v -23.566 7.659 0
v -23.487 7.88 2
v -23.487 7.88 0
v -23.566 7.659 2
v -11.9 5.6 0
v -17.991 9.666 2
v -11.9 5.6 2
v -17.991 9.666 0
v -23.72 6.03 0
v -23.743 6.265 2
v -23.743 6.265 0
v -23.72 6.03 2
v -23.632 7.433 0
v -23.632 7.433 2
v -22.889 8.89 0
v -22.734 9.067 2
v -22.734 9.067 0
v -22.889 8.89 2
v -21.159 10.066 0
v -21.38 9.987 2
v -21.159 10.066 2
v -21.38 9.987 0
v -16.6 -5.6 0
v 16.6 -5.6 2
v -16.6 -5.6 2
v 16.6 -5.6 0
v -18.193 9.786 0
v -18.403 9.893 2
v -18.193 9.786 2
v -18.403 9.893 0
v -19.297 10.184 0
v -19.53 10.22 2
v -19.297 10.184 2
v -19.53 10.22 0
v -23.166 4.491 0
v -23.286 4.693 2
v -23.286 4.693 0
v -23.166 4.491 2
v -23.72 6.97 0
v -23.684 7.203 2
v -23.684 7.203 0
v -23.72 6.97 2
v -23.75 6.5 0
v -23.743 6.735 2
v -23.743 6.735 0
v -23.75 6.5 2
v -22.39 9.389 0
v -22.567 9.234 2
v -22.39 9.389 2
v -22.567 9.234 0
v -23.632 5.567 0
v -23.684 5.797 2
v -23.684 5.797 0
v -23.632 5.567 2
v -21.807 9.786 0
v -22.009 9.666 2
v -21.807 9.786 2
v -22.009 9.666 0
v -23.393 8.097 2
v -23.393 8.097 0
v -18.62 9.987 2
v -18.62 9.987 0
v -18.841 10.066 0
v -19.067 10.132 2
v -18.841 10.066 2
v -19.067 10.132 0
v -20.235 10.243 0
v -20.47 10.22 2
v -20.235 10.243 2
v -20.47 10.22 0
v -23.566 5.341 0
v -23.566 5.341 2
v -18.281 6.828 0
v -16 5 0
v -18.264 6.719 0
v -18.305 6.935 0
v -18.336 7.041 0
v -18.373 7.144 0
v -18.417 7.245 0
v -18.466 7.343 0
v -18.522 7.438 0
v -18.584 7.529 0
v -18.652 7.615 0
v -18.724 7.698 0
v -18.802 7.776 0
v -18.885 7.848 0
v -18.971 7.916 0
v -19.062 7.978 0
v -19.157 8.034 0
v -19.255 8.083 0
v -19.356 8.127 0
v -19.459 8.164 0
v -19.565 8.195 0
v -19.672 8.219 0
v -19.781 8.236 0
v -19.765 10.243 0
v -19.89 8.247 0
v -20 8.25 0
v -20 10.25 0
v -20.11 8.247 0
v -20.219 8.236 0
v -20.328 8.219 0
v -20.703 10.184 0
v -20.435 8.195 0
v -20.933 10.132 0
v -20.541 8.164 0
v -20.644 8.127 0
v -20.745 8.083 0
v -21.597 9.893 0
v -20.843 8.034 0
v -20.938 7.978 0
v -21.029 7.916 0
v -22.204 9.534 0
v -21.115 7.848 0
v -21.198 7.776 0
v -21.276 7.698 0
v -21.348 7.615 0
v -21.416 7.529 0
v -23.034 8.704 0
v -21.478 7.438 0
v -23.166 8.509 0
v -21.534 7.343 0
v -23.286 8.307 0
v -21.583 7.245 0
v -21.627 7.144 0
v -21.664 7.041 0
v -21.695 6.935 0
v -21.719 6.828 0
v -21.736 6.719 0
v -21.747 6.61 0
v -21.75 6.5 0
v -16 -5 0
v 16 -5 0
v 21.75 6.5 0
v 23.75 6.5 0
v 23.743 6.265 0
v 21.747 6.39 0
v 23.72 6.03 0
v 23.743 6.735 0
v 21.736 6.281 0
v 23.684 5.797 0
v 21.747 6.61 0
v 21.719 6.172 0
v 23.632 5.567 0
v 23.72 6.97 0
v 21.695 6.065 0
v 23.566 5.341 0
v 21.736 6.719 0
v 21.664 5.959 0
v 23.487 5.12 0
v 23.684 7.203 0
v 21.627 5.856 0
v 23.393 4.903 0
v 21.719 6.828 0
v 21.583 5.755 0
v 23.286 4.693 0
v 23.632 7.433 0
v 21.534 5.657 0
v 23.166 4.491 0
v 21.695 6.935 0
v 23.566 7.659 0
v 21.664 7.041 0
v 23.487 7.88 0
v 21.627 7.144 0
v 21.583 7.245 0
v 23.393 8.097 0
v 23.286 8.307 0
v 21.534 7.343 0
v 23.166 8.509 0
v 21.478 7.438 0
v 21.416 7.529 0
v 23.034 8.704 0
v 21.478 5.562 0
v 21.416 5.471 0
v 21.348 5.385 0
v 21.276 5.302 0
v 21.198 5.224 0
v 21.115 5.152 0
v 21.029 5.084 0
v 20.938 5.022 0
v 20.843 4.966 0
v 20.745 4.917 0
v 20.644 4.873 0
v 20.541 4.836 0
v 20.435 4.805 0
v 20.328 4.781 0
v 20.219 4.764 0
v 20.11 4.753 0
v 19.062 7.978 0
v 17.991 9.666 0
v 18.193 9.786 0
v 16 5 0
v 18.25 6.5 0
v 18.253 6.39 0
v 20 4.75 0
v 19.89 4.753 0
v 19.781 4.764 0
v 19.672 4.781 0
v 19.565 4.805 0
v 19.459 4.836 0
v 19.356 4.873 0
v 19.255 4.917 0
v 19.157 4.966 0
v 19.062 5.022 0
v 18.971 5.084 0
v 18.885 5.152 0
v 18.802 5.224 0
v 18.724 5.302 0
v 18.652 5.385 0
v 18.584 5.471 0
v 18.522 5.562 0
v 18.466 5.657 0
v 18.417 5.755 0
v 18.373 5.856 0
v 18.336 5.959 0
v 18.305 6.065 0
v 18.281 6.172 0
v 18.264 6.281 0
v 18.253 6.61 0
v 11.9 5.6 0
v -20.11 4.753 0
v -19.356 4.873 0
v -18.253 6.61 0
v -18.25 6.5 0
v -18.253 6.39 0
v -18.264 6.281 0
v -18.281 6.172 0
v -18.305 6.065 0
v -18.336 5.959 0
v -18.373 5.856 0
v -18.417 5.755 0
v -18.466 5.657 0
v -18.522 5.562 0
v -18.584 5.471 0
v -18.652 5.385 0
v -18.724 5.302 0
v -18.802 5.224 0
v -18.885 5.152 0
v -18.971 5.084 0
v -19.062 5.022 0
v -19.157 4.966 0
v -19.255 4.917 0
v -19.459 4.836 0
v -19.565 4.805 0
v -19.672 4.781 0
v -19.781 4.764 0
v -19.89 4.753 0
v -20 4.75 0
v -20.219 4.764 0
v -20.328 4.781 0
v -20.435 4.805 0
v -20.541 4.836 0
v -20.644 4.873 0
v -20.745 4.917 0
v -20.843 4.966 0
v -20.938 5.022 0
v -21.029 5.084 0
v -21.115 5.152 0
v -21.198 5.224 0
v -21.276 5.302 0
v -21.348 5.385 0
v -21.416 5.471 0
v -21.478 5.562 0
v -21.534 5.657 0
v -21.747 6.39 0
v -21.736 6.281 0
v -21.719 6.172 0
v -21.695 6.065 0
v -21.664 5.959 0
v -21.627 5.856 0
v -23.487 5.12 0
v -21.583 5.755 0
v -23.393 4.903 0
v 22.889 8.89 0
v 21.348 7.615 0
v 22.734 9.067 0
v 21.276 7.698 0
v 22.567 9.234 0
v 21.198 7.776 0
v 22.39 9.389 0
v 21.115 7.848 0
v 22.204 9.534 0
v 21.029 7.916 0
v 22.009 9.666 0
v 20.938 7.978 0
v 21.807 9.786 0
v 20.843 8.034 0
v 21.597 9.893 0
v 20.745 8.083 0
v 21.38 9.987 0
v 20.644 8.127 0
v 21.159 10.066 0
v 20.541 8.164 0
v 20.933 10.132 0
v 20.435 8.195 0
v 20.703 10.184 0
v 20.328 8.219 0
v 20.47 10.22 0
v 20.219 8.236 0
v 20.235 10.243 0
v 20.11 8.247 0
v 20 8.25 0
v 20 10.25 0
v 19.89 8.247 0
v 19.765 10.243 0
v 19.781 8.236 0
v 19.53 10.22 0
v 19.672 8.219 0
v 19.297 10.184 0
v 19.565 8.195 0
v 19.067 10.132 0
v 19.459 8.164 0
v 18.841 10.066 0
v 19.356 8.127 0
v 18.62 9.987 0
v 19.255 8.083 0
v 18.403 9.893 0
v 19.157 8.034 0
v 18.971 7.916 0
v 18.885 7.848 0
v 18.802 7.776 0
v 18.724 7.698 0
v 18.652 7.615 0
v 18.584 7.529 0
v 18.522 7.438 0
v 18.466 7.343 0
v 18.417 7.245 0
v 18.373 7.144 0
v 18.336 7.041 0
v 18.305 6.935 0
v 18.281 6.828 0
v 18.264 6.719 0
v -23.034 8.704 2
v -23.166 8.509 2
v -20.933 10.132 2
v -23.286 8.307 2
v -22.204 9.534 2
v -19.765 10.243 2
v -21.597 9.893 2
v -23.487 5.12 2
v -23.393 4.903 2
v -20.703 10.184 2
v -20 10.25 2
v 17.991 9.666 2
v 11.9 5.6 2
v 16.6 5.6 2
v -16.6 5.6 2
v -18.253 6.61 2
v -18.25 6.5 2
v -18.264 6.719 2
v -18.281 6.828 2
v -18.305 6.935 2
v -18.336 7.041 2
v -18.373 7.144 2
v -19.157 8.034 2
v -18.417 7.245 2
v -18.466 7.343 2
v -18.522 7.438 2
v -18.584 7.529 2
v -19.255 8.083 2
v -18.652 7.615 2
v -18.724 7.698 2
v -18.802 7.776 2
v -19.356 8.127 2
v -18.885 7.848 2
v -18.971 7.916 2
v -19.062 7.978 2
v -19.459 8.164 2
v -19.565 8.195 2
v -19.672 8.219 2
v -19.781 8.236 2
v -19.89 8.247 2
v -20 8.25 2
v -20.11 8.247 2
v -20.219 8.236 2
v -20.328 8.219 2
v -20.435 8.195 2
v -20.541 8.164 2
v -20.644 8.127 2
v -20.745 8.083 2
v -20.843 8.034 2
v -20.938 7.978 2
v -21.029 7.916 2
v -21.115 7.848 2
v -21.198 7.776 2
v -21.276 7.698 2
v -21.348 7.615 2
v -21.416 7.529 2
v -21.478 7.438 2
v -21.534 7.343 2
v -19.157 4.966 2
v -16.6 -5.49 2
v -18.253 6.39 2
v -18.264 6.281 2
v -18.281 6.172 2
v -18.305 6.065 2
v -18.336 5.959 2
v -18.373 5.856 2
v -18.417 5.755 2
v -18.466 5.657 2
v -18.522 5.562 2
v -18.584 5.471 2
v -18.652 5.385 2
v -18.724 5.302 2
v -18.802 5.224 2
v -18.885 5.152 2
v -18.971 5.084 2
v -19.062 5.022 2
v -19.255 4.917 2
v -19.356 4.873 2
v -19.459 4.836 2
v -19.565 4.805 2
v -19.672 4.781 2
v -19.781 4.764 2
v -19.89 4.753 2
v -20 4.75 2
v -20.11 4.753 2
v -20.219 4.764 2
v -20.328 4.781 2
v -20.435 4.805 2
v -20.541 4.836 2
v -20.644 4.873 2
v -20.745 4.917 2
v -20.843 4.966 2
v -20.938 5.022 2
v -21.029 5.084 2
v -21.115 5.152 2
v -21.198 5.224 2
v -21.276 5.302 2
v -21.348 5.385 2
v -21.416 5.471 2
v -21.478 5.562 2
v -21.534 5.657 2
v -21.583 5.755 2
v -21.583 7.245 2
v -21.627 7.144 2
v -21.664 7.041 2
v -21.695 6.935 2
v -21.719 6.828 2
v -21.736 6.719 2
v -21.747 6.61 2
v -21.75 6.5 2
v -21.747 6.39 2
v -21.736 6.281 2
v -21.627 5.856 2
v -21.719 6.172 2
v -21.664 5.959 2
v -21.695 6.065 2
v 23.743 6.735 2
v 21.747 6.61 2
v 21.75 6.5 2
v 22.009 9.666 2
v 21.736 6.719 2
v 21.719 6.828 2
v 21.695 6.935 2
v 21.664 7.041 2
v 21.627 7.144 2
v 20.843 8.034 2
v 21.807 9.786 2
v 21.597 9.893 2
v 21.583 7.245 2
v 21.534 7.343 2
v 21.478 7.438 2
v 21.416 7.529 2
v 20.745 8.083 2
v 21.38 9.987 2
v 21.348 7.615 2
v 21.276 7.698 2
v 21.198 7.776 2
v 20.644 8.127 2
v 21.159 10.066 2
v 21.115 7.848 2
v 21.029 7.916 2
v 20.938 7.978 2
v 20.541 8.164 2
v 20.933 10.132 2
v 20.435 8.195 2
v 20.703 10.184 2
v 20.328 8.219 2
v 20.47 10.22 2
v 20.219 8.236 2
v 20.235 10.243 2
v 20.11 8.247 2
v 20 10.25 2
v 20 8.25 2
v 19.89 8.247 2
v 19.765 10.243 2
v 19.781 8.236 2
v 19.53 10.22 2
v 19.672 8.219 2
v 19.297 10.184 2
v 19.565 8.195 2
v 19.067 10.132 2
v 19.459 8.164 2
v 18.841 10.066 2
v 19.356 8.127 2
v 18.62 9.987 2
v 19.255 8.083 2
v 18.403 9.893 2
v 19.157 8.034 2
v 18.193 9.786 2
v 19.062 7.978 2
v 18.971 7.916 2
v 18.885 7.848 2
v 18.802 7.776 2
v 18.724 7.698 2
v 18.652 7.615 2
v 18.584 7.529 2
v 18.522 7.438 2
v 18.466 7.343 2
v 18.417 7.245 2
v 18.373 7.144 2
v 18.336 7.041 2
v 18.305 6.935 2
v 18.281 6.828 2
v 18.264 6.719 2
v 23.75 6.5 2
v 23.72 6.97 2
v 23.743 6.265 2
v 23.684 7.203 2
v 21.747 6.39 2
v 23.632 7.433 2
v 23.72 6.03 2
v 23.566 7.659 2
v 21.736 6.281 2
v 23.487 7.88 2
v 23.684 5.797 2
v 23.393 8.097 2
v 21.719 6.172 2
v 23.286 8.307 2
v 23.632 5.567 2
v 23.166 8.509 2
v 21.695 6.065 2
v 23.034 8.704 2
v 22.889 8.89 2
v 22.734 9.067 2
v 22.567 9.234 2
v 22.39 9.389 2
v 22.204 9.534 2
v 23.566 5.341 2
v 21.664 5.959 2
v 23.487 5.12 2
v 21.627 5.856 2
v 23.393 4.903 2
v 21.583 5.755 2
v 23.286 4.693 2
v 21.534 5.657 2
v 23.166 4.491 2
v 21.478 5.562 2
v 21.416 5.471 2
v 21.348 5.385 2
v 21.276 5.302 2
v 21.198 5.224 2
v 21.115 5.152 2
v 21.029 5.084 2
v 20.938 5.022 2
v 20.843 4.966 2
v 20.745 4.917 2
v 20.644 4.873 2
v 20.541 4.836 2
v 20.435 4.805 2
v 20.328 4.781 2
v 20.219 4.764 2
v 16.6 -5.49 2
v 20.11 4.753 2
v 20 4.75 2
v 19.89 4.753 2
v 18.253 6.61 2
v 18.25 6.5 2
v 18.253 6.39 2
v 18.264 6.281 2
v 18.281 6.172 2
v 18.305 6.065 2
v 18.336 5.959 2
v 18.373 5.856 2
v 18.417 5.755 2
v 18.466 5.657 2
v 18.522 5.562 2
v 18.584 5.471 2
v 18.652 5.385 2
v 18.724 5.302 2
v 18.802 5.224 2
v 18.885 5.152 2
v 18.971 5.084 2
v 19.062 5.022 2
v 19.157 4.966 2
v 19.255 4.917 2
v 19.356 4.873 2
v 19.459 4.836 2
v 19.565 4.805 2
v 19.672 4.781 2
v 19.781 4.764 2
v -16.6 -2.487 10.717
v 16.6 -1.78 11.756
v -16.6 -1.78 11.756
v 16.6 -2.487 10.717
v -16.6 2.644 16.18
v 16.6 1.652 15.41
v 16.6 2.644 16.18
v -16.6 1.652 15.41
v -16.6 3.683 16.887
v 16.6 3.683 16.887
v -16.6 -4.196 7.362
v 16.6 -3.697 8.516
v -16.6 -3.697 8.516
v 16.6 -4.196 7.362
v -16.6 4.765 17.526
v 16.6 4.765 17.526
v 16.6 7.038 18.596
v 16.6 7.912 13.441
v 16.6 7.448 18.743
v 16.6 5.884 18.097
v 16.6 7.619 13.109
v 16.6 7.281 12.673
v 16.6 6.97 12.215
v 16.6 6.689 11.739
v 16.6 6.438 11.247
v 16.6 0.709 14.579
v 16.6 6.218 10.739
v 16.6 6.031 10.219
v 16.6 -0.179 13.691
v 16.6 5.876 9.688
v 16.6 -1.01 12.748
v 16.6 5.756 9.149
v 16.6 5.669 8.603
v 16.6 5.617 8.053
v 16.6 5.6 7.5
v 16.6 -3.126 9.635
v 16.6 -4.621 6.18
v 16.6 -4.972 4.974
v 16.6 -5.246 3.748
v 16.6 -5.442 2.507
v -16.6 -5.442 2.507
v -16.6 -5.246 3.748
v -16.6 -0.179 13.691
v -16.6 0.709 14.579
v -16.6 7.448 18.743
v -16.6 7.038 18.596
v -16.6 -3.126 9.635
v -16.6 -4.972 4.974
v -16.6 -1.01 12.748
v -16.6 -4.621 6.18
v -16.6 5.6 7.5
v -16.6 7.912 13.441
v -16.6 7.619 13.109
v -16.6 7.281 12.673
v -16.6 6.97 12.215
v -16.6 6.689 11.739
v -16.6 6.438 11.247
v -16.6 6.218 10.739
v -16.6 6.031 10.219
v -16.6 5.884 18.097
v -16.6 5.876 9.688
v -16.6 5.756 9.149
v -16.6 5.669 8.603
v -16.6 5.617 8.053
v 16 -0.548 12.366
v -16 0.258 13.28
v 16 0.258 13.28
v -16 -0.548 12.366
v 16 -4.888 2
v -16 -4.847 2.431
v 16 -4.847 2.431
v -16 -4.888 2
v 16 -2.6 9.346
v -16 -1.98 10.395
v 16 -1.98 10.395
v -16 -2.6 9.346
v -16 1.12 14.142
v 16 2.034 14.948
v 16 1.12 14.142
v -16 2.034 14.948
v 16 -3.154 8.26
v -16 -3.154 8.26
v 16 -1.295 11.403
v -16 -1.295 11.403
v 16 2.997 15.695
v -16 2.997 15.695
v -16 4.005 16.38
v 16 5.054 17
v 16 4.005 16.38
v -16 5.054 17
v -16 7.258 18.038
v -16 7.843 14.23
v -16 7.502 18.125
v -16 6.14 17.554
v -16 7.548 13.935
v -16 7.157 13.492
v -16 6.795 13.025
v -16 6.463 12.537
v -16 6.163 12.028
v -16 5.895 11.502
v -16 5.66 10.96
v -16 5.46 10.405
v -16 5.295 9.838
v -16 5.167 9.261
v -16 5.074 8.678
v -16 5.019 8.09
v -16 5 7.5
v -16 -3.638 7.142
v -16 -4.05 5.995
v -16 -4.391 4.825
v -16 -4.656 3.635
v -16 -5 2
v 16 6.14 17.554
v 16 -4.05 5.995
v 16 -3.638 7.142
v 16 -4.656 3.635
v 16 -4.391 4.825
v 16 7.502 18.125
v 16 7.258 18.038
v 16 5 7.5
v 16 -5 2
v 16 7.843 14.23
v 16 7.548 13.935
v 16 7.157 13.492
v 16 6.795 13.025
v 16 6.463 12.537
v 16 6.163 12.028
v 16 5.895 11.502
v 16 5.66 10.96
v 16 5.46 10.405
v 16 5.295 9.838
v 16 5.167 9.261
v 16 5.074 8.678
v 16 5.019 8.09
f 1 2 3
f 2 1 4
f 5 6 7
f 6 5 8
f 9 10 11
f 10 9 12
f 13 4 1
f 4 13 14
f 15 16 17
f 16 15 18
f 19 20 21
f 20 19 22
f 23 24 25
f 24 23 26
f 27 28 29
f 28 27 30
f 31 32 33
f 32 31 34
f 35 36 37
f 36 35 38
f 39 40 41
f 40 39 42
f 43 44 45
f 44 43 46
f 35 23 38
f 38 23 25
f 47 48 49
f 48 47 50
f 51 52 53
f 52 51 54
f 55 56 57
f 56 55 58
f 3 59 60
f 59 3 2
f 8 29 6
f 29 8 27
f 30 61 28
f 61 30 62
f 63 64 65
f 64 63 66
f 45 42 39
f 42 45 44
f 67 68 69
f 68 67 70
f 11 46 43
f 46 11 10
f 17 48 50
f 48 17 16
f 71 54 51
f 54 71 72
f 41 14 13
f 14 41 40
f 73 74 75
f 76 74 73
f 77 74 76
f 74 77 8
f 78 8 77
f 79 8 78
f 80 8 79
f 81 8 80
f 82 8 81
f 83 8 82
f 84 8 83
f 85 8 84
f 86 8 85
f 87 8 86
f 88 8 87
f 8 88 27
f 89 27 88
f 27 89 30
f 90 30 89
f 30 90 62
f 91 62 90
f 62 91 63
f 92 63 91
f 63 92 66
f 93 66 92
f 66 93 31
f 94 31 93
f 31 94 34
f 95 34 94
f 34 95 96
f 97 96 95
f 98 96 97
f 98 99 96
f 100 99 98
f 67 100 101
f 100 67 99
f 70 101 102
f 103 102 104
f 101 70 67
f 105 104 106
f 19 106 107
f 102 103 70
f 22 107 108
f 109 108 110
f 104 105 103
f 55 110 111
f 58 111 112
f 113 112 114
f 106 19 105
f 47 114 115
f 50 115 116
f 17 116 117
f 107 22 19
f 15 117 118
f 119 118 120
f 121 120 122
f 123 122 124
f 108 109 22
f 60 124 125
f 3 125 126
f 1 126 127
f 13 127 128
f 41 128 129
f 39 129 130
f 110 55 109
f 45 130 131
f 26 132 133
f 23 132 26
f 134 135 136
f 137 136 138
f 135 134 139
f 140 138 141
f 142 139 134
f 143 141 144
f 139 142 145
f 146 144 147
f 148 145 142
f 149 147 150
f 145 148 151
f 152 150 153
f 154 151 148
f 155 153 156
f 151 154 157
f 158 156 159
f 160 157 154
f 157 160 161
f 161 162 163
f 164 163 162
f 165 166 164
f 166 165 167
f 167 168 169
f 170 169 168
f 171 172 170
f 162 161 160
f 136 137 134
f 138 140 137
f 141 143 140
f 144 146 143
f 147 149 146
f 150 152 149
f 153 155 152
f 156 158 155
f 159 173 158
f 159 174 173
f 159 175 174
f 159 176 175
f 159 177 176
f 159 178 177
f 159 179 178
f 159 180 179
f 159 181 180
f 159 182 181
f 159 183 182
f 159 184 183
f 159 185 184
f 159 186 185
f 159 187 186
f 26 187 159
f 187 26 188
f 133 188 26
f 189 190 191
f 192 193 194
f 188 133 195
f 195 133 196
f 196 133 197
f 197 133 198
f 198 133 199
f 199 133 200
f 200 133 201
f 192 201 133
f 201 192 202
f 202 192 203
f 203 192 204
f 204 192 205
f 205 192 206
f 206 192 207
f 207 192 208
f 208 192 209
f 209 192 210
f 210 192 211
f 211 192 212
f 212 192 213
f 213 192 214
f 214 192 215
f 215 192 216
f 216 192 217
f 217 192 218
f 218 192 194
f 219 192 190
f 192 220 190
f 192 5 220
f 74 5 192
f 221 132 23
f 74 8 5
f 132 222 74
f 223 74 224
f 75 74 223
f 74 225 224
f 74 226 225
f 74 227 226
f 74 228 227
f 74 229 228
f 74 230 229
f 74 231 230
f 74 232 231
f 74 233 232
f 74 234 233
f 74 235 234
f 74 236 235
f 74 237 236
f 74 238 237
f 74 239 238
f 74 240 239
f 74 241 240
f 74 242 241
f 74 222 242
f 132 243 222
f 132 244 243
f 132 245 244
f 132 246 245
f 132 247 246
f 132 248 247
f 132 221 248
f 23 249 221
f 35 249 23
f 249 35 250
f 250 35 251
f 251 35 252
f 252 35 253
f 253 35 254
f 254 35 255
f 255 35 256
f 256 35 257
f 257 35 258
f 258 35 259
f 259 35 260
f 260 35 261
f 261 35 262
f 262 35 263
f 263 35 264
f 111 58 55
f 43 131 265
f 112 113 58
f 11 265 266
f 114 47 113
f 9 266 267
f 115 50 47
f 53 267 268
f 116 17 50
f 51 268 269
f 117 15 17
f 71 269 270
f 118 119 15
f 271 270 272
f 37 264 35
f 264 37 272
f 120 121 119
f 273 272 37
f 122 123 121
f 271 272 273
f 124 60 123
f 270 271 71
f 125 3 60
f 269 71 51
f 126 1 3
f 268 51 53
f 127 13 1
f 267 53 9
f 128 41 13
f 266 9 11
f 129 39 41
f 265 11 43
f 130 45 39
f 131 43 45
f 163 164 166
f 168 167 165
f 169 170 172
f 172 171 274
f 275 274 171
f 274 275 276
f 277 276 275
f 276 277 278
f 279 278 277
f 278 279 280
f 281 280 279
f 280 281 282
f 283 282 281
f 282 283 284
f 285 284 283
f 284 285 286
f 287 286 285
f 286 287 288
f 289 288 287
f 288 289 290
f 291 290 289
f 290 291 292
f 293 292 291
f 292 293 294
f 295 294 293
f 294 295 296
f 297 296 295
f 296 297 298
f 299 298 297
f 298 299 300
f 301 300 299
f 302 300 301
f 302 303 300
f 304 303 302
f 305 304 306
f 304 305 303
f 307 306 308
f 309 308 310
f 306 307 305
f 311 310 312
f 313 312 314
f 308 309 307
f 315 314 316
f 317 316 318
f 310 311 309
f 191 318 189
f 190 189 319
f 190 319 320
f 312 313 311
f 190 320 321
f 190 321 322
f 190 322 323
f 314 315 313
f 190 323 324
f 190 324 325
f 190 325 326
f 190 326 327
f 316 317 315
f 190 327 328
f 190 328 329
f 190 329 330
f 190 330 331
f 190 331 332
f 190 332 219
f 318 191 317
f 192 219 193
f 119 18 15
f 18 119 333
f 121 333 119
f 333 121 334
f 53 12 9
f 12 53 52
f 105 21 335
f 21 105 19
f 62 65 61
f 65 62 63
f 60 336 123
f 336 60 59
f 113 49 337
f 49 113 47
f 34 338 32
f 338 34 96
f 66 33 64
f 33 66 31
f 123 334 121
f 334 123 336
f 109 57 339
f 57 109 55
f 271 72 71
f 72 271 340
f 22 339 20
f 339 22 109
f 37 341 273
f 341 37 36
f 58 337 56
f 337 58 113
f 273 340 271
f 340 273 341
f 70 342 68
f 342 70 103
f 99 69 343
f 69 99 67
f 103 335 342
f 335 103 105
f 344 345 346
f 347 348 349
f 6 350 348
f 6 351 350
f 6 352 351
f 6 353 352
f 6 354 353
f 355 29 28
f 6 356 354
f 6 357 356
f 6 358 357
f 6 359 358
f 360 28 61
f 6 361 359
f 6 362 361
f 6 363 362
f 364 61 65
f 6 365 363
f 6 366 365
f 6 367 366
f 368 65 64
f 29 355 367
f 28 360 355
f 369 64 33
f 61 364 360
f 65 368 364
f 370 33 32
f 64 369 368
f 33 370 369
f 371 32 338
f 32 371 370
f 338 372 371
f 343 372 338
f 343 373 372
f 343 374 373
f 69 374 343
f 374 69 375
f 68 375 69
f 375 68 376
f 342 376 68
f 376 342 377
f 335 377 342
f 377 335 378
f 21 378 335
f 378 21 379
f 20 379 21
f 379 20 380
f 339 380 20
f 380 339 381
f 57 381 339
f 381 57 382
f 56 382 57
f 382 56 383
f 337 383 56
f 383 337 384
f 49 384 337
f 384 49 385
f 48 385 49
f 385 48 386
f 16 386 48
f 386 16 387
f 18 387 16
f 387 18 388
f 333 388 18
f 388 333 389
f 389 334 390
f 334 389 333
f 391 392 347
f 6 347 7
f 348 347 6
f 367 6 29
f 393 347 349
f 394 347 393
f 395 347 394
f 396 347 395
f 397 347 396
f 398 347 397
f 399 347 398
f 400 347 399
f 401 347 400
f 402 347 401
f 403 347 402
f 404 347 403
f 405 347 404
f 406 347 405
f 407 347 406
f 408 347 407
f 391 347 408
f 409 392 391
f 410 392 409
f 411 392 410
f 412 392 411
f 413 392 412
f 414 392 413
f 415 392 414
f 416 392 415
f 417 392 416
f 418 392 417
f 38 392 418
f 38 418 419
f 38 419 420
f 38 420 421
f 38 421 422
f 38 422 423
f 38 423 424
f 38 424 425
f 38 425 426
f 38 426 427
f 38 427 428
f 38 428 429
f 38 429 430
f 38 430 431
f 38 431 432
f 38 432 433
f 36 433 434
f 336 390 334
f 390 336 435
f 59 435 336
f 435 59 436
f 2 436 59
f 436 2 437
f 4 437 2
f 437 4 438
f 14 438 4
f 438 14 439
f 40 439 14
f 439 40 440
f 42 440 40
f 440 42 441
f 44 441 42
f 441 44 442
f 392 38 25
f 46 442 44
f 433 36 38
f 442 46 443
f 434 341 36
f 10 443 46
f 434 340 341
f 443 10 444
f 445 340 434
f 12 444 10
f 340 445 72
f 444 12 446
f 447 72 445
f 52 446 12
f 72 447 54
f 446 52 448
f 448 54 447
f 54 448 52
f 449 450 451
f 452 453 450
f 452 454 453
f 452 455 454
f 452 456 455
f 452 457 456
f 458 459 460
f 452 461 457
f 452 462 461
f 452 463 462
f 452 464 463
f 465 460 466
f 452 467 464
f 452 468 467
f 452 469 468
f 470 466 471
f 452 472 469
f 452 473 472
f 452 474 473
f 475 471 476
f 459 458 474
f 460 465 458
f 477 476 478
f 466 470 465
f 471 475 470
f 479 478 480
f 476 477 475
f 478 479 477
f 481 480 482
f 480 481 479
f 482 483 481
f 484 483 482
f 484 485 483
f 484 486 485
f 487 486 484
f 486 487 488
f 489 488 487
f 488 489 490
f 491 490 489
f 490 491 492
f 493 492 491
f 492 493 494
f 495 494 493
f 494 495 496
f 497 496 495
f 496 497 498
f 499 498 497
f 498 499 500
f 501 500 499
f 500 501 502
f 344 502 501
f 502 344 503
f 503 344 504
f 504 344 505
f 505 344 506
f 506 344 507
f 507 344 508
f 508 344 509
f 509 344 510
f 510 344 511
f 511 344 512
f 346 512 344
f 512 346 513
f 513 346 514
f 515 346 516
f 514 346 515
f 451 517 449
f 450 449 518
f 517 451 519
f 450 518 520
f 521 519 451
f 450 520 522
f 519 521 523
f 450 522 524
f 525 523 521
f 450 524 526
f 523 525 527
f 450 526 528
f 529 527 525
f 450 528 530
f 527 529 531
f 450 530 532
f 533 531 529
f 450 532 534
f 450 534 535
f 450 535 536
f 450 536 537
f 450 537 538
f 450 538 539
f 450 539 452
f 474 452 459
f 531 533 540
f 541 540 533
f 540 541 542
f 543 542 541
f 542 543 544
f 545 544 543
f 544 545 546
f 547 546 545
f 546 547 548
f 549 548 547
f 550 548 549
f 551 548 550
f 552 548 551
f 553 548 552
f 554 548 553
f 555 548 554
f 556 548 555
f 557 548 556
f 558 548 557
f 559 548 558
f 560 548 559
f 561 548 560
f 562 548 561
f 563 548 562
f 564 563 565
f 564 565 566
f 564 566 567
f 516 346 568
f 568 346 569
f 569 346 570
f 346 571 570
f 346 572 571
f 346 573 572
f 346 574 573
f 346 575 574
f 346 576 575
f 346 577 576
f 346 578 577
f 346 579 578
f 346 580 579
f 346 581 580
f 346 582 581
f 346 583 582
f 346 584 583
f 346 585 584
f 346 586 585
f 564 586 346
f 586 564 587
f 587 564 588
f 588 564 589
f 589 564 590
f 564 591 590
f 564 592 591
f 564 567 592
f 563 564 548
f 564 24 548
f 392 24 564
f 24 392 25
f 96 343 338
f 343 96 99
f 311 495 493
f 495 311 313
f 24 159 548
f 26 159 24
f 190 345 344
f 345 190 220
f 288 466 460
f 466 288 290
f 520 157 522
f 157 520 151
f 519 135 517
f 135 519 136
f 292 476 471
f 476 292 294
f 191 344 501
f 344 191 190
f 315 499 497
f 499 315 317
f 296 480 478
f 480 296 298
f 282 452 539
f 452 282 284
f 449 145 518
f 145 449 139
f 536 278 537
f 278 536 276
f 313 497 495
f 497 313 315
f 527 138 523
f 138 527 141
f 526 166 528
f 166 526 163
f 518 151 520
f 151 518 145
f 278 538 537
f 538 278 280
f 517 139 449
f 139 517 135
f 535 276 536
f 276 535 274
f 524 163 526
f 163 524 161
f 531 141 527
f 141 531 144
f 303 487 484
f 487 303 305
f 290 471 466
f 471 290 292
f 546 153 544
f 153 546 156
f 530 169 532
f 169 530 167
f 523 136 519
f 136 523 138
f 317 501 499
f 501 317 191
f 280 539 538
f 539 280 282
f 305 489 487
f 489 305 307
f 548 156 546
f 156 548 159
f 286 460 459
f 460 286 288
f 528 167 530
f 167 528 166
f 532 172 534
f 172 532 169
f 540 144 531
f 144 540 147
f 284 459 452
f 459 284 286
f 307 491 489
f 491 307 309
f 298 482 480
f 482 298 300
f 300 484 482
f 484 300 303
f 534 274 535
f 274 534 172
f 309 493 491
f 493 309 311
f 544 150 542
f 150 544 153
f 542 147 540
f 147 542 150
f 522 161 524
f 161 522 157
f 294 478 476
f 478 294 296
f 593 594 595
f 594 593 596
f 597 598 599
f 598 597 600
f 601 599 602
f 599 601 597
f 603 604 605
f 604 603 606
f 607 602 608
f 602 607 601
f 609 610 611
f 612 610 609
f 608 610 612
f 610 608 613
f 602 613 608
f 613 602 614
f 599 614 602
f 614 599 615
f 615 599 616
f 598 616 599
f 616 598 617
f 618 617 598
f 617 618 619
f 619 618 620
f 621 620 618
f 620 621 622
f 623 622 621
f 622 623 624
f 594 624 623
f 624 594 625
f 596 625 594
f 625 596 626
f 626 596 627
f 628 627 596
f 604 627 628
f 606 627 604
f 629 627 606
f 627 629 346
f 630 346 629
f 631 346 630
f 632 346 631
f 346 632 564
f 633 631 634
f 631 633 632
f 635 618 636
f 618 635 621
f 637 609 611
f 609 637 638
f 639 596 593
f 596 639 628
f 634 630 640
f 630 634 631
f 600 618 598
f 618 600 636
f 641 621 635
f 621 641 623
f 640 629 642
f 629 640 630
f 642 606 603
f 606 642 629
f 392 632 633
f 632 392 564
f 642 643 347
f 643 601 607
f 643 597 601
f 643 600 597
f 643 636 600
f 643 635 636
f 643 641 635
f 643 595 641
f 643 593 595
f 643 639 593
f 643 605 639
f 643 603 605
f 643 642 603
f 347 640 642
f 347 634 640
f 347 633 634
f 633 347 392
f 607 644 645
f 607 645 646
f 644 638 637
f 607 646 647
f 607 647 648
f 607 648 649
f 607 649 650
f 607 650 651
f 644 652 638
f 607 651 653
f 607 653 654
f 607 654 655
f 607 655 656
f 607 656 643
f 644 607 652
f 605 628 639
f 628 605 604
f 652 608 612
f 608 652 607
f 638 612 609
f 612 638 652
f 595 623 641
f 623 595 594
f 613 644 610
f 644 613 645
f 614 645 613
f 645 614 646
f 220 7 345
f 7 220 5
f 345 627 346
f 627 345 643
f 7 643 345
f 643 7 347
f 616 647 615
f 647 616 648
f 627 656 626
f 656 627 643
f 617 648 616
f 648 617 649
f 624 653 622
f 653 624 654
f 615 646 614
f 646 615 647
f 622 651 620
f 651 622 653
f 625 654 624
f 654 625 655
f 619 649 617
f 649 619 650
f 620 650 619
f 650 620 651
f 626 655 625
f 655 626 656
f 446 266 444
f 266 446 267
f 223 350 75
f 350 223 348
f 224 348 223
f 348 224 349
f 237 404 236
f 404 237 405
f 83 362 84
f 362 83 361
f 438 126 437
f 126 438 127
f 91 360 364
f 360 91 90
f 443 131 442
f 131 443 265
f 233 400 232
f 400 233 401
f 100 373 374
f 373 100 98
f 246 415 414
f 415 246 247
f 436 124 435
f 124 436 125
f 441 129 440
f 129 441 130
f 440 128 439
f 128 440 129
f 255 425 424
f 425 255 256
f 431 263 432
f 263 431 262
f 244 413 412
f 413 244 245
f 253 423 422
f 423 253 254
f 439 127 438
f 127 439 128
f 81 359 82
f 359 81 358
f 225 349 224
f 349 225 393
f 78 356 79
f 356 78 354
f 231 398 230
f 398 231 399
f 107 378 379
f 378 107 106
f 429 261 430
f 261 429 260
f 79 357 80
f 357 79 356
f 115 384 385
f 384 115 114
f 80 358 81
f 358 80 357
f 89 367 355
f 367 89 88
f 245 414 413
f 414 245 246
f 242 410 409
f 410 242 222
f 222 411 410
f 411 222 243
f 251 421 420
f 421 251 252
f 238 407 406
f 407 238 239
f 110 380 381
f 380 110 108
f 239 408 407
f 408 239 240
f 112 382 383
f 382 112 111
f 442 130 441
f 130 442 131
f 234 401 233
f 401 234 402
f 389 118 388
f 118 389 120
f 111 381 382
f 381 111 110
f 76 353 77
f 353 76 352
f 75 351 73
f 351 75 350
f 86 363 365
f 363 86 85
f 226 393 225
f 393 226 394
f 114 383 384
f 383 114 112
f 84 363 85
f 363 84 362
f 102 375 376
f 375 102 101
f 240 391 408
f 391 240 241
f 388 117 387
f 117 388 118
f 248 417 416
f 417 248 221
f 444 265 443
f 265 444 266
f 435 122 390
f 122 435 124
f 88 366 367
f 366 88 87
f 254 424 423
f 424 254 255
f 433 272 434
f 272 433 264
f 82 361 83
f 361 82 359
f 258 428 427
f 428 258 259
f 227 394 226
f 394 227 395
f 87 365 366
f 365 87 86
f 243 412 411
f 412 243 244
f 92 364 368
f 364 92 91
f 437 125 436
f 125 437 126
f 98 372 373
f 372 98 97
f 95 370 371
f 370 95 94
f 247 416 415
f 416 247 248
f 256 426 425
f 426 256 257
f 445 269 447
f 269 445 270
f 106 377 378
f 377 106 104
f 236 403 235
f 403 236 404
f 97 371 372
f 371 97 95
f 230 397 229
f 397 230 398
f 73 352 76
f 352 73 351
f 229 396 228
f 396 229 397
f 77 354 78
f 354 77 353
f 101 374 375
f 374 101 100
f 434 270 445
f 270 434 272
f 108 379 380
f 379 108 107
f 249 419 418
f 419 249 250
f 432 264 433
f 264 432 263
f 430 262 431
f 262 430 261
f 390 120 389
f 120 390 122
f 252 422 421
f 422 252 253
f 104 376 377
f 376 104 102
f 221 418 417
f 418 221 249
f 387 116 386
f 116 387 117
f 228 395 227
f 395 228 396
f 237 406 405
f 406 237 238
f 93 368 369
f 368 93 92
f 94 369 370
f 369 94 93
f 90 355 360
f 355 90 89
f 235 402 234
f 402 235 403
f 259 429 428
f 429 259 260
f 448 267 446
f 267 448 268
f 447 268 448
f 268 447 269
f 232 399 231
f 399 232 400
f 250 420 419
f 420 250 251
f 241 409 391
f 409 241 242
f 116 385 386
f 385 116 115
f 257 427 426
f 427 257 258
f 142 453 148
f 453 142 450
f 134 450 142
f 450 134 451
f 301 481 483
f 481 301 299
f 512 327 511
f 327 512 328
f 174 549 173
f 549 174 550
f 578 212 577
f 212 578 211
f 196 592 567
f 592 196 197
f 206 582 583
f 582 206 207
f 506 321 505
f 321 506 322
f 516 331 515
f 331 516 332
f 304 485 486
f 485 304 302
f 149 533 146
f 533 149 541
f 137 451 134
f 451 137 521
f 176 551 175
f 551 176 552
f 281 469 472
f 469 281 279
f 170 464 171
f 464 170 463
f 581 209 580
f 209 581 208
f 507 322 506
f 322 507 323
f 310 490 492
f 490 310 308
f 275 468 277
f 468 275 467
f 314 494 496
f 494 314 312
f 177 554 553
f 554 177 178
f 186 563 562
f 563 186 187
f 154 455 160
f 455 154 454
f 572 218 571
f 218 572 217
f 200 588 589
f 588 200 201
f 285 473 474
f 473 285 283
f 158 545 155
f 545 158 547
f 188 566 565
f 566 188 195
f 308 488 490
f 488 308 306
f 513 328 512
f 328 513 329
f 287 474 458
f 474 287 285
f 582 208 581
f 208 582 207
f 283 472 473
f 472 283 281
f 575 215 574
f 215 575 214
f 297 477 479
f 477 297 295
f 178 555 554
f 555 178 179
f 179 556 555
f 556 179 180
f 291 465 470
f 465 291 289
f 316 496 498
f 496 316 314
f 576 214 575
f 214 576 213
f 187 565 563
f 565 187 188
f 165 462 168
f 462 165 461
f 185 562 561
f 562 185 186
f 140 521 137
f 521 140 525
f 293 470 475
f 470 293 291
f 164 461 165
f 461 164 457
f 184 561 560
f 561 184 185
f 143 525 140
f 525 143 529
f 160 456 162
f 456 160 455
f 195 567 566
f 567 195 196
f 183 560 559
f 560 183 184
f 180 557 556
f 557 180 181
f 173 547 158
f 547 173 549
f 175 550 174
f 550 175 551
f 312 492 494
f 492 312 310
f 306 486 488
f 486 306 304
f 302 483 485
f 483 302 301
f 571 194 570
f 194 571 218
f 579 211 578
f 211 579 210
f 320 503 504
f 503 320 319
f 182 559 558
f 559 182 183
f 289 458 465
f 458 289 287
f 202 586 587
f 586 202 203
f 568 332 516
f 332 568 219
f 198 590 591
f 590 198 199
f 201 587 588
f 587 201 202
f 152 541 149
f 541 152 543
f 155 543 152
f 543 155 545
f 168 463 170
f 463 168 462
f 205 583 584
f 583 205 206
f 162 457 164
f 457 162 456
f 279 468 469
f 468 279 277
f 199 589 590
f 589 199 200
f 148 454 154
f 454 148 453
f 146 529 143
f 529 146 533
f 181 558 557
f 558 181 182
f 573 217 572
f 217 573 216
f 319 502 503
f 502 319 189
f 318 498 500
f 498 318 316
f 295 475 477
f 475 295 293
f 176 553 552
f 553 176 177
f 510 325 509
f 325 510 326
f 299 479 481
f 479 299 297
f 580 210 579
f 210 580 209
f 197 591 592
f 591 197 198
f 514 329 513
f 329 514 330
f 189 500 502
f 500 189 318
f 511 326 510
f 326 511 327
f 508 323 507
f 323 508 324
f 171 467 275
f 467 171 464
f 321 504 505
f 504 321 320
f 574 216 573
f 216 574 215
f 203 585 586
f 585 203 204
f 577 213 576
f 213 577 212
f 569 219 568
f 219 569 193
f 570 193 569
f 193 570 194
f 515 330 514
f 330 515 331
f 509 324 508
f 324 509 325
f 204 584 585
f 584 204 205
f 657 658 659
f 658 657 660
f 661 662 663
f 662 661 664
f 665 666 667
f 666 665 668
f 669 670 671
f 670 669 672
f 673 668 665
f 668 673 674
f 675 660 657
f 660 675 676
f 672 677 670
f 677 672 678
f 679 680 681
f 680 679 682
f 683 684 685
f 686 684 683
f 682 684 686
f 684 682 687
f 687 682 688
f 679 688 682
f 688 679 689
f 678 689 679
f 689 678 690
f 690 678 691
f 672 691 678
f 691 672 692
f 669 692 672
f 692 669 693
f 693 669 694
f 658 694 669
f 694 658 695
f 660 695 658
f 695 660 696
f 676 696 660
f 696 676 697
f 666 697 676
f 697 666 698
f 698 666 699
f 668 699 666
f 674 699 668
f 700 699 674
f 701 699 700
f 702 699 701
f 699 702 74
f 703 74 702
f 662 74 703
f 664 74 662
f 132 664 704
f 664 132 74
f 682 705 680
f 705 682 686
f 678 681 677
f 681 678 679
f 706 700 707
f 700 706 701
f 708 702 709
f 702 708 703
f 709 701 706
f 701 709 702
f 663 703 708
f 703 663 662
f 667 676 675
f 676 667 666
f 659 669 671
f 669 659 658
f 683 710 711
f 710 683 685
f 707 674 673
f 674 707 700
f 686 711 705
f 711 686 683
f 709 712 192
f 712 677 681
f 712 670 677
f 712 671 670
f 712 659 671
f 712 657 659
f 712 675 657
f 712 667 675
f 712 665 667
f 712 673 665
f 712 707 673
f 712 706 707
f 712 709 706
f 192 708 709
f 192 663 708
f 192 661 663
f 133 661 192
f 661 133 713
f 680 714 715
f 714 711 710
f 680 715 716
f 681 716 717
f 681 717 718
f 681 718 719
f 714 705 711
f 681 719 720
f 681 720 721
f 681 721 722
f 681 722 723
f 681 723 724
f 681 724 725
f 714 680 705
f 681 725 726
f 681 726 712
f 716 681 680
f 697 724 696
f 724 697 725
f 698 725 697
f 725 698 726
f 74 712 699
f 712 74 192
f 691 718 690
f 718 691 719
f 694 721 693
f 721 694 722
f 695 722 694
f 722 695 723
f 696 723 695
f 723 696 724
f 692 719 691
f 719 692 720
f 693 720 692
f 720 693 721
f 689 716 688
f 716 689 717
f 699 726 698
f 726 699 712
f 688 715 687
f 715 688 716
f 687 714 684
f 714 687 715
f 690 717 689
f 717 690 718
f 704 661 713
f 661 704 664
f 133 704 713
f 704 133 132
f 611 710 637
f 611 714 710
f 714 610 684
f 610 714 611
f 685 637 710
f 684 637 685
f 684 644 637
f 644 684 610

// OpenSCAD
MOUNT_HOLE_DIA = 3.5;
MOUNT_HOLE_SPACING = 40;

SLOT_OFFSET = 6.5;
SLOT_LENGTH = 32;
SLOT_WIDTH = 10;

HEIGHT = 20;
WALL_THICKNESS = 0.6;
THICKNESS = 2;

OUTPUT_WIDTH = 2.5;
OUTPUT_ANGLE = 5;

$fn = 100;

module duct(width, length, height, output_width) {
  intersection() {
    translate([0, (height * 2 - width)/2, 0])
    rotate([0, 90, 0])
    difference() {
      cylinder(d = height * 2, h = length, center = true);
      hull() {
        translate([-(width - output_width), 0, 0])
        cylinder(d = height * 2 - width * 2, h = length * 2, center = true);
        cylinder(d = height * 2 - width * 2, h = length * 2, center = true);
      }
    }
    
    translate([-length/2, -(SLOT_WIDTH + SLOT_OFFSET)/2, 0])
    cube(size = [length, SLOT_WIDTH + SLOT_OFFSET, height]);
  }
}

module holes() {
  #union() {
    cube(size = [SLOT_LENGTH, SLOT_WIDTH, THICKNESS * 2], center = true);

    for(i = [-1, 1]) {
      translate([i * MOUNT_HOLE_SPACING/2, SLOT_OFFSET, 0])
      cylinder(d = MOUNT_HOLE_DIA, h = THICKNESS * 2, center = true);
    }
    
    duct(SLOT_WIDTH, SLOT_LENGTH, HEIGHT - WALL_THICKNESS, OUTPUT_WIDTH);
  }
}

module cooler() {
  wt = 2 * WALL_THICKNESS;
  union() {
    translate([-(SLOT_LENGTH + wt)/2, -(SLOT_WIDTH + wt)/2, 0])
    cube(size = [SLOT_LENGTH + wt, SLOT_WIDTH + wt, THICKNESS]);

    for(i = [-1, 1]) {
      hull() {
        translate([i * MOUNT_HOLE_SPACING/2, SLOT_OFFSET, 0])
        cylinder(d = MOUNT_HOLE_DIA + 2 * THICKNESS, h = THICKNESS);

        translate([i * (SLOT_LENGTH - MOUNT_HOLE_DIA)/2 -(MOUNT_HOLE_DIA + wt)/2, -(SLOT_WIDTH + wt)/2, 0])
        cube(size = [MOUNT_HOLE_DIA + wt, SLOT_WIDTH + wt, THICKNESS]);
      }
    }
    
    duct(SLOT_WIDTH + wt, SLOT_LENGTH + wt, HEIGHT, OUTPUT_WIDTH + wt);
  }
}

module cutoff() {
  wt = 2 * WALL_THICKNESS;
  #translate([0, SLOT_WIDTH + wt + SLOT_OFFSET, HEIGHT - (OUTPUT_WIDTH + wt)])
  rotate([OUTPUT_ANGLE, 0, 0])
  translate([0, -SLOT_WIDTH/2, 0])
  cube(size = [SLOT_LENGTH + wt, SLOT_WIDTH, SLOT_WIDTH * 2], center = true);
}

difference() {
  cooler();
  holes();
  cutoff();
}
